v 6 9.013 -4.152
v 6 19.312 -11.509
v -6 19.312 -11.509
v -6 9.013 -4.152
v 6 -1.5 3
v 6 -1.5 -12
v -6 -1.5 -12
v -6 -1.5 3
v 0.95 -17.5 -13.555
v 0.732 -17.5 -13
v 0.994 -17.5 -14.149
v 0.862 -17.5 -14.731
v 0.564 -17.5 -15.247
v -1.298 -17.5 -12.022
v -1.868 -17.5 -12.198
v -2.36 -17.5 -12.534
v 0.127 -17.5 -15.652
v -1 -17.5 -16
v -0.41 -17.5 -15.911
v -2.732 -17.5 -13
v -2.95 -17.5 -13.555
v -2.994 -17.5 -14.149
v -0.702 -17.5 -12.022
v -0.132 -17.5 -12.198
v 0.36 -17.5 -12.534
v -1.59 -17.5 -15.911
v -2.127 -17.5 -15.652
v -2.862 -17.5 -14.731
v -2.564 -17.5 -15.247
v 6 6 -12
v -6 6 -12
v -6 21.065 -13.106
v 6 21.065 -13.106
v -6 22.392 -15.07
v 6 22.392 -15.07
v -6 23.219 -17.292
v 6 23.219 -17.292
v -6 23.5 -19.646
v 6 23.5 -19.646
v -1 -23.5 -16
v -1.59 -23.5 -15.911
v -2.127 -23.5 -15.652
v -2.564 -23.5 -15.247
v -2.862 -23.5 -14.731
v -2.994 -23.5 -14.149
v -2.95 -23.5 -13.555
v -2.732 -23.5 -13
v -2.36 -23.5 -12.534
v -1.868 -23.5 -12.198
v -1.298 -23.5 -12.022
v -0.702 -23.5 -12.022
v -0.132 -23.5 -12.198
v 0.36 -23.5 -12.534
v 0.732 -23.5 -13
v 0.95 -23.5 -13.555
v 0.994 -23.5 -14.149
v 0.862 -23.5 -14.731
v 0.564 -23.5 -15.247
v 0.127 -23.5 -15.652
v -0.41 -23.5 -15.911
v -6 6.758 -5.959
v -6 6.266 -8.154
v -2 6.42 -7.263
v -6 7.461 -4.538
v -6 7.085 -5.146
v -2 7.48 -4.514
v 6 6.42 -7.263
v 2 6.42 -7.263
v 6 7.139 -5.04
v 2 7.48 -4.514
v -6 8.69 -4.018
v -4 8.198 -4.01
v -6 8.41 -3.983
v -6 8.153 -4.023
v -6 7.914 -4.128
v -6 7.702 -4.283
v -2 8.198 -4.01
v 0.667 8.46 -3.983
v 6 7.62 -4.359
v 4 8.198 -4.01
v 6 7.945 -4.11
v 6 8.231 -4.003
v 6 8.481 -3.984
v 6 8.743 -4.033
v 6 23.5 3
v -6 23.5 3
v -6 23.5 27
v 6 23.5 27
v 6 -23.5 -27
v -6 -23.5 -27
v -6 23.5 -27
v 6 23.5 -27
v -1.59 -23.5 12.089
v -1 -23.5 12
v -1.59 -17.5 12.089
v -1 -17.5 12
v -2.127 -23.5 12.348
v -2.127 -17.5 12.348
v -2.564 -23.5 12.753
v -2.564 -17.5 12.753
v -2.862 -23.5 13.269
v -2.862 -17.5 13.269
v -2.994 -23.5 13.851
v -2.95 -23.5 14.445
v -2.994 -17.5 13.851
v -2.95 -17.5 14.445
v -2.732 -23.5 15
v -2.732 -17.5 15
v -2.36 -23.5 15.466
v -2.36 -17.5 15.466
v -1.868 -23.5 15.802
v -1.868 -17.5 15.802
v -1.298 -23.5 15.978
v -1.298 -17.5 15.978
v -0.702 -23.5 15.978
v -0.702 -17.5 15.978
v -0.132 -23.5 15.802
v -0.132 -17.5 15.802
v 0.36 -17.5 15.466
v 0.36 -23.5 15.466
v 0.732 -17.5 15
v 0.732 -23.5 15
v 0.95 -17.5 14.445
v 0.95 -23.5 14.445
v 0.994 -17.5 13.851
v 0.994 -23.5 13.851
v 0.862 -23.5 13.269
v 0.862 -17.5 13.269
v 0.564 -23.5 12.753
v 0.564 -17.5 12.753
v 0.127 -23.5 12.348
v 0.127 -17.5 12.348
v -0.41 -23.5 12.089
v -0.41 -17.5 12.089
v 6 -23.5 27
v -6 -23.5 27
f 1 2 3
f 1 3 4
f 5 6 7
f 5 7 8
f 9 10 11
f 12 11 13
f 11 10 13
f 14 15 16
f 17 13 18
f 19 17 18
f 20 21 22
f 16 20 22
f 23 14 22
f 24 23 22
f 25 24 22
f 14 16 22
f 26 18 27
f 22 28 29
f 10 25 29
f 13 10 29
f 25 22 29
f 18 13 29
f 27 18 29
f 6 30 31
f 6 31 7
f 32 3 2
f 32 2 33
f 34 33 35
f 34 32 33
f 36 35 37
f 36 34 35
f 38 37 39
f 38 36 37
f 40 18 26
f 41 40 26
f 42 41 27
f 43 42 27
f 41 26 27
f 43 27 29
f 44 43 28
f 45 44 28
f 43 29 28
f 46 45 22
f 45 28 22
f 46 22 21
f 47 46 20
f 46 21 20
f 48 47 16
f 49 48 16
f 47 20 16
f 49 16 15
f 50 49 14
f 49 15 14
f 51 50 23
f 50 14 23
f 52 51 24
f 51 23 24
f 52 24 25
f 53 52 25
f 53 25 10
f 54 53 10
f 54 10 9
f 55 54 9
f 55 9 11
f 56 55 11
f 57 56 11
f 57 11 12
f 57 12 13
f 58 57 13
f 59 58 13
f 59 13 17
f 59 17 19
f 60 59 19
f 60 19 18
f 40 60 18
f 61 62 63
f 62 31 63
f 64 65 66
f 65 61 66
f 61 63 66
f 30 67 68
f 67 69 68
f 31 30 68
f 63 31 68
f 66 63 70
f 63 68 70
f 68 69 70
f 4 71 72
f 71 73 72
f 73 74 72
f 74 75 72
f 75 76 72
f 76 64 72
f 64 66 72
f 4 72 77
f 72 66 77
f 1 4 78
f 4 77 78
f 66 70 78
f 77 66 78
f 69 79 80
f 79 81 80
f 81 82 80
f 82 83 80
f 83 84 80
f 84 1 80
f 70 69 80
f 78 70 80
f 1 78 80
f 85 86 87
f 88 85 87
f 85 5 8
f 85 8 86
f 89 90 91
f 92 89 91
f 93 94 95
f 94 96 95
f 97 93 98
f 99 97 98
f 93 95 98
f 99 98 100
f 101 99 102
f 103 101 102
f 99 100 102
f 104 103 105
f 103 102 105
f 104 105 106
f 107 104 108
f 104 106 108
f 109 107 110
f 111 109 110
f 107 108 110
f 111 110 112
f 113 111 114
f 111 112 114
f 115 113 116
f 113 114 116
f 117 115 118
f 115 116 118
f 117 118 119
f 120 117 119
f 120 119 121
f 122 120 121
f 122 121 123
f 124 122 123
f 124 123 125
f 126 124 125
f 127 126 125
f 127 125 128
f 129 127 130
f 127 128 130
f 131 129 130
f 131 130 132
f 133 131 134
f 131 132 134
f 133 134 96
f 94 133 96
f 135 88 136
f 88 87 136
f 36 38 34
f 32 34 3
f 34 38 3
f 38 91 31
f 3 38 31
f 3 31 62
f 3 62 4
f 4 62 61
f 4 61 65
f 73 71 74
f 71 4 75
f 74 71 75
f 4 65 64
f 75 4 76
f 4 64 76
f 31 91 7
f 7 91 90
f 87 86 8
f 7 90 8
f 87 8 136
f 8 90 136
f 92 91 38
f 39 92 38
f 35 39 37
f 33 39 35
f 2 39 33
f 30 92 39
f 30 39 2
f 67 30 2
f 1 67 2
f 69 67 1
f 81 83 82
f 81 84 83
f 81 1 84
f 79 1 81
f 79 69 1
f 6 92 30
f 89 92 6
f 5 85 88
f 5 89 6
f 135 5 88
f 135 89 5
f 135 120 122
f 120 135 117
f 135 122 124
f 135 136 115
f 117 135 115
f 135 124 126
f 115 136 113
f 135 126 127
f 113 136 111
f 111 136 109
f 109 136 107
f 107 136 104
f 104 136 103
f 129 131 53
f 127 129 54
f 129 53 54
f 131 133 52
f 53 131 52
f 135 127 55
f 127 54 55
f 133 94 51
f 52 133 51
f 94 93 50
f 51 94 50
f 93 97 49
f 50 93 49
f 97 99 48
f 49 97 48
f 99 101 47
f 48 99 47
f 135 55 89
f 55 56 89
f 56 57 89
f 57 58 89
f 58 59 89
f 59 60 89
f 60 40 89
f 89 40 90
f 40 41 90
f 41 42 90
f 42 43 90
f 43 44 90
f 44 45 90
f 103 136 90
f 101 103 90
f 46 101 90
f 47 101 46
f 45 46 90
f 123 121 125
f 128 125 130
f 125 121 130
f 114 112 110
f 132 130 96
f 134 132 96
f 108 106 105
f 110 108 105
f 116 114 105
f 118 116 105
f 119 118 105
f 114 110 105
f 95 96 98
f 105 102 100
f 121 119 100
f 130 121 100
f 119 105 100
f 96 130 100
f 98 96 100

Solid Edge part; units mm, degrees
sketch "Sketch1" plane through (0, 0, 0) normal (1, 0, 0) x (0, 1, 0)
  line L0 (-23.5, -27) -> (23.5, -27)
  line L1 (23.5, -27) -> (23.5, 27)
  line L2 (23.5, 27) -> (-23.5, 27)
  line L3 (-23.5, 27) -> (-23.5, -27)
  dimension "D1" = 54
  dimension "D2" = 47
extrude "Protrusion1" add sketch "Sketch1" along normal mid plane 12
hole "Bohrung_1" at (-1, -23.5, 14) direction (0, 1, 0) diameter 4 depth 6
hole "Hole1" at (-1, -23.5, -14) direction (0, 1, 0) diameter 4 depth 6
sketch "Sketch2" plane through (6, 0, 0) normal (1, 0, 0) x (0, 1, 0)
  line L0 (23.5, -14.5) -> (6, -2)
  line L1 (6, -2) -> (6, -12)
  line L2 (6, -12) -> (-1.5, -12)
  line L3 (-1.5, -12) -> (-1.5, 3)
  line L4 (-1.5, 3) -> (23.5, 3)
  line L5 (23.5, 3) -> (23.5, -14.5)
  dimension "D1" = 25
  dimension "D2" = 7.5
  dimension "D3" = 10
  dimension "D4" = 15
  dimension "D5" = 12.5
  dimension "D6" = 15
extrude "Extrusionsausschnitt_1" cut sketch "Sketch2" against normal blind 135.5146
sketch "Sketch3" plane through (6, 0, 0) normal (1, 0, 0) x (0, 1, 0)
  spline S0 degree 3 poles (6, -12) (6.0478, -6.0252) (7.4729, -2.7697) (9.3635, -4.4025) knots 0 0 0 0 1 1 1 1
  line L0 (9.3635, -4.4025) -> (9.8723, -3.23)
  line L1 (9.8723, -3.23) -> (5.7538, -1.5265)
  line L2 (5.7538, -1.5265) -> (6, -12)
extrude "Extrusionsausschnitt_3" cut sketch "Sketch3" along normal mid plane 89.7467
fillet "Verrundung_1" radius 10 1 edges at (0, 23.5, -14.5)
